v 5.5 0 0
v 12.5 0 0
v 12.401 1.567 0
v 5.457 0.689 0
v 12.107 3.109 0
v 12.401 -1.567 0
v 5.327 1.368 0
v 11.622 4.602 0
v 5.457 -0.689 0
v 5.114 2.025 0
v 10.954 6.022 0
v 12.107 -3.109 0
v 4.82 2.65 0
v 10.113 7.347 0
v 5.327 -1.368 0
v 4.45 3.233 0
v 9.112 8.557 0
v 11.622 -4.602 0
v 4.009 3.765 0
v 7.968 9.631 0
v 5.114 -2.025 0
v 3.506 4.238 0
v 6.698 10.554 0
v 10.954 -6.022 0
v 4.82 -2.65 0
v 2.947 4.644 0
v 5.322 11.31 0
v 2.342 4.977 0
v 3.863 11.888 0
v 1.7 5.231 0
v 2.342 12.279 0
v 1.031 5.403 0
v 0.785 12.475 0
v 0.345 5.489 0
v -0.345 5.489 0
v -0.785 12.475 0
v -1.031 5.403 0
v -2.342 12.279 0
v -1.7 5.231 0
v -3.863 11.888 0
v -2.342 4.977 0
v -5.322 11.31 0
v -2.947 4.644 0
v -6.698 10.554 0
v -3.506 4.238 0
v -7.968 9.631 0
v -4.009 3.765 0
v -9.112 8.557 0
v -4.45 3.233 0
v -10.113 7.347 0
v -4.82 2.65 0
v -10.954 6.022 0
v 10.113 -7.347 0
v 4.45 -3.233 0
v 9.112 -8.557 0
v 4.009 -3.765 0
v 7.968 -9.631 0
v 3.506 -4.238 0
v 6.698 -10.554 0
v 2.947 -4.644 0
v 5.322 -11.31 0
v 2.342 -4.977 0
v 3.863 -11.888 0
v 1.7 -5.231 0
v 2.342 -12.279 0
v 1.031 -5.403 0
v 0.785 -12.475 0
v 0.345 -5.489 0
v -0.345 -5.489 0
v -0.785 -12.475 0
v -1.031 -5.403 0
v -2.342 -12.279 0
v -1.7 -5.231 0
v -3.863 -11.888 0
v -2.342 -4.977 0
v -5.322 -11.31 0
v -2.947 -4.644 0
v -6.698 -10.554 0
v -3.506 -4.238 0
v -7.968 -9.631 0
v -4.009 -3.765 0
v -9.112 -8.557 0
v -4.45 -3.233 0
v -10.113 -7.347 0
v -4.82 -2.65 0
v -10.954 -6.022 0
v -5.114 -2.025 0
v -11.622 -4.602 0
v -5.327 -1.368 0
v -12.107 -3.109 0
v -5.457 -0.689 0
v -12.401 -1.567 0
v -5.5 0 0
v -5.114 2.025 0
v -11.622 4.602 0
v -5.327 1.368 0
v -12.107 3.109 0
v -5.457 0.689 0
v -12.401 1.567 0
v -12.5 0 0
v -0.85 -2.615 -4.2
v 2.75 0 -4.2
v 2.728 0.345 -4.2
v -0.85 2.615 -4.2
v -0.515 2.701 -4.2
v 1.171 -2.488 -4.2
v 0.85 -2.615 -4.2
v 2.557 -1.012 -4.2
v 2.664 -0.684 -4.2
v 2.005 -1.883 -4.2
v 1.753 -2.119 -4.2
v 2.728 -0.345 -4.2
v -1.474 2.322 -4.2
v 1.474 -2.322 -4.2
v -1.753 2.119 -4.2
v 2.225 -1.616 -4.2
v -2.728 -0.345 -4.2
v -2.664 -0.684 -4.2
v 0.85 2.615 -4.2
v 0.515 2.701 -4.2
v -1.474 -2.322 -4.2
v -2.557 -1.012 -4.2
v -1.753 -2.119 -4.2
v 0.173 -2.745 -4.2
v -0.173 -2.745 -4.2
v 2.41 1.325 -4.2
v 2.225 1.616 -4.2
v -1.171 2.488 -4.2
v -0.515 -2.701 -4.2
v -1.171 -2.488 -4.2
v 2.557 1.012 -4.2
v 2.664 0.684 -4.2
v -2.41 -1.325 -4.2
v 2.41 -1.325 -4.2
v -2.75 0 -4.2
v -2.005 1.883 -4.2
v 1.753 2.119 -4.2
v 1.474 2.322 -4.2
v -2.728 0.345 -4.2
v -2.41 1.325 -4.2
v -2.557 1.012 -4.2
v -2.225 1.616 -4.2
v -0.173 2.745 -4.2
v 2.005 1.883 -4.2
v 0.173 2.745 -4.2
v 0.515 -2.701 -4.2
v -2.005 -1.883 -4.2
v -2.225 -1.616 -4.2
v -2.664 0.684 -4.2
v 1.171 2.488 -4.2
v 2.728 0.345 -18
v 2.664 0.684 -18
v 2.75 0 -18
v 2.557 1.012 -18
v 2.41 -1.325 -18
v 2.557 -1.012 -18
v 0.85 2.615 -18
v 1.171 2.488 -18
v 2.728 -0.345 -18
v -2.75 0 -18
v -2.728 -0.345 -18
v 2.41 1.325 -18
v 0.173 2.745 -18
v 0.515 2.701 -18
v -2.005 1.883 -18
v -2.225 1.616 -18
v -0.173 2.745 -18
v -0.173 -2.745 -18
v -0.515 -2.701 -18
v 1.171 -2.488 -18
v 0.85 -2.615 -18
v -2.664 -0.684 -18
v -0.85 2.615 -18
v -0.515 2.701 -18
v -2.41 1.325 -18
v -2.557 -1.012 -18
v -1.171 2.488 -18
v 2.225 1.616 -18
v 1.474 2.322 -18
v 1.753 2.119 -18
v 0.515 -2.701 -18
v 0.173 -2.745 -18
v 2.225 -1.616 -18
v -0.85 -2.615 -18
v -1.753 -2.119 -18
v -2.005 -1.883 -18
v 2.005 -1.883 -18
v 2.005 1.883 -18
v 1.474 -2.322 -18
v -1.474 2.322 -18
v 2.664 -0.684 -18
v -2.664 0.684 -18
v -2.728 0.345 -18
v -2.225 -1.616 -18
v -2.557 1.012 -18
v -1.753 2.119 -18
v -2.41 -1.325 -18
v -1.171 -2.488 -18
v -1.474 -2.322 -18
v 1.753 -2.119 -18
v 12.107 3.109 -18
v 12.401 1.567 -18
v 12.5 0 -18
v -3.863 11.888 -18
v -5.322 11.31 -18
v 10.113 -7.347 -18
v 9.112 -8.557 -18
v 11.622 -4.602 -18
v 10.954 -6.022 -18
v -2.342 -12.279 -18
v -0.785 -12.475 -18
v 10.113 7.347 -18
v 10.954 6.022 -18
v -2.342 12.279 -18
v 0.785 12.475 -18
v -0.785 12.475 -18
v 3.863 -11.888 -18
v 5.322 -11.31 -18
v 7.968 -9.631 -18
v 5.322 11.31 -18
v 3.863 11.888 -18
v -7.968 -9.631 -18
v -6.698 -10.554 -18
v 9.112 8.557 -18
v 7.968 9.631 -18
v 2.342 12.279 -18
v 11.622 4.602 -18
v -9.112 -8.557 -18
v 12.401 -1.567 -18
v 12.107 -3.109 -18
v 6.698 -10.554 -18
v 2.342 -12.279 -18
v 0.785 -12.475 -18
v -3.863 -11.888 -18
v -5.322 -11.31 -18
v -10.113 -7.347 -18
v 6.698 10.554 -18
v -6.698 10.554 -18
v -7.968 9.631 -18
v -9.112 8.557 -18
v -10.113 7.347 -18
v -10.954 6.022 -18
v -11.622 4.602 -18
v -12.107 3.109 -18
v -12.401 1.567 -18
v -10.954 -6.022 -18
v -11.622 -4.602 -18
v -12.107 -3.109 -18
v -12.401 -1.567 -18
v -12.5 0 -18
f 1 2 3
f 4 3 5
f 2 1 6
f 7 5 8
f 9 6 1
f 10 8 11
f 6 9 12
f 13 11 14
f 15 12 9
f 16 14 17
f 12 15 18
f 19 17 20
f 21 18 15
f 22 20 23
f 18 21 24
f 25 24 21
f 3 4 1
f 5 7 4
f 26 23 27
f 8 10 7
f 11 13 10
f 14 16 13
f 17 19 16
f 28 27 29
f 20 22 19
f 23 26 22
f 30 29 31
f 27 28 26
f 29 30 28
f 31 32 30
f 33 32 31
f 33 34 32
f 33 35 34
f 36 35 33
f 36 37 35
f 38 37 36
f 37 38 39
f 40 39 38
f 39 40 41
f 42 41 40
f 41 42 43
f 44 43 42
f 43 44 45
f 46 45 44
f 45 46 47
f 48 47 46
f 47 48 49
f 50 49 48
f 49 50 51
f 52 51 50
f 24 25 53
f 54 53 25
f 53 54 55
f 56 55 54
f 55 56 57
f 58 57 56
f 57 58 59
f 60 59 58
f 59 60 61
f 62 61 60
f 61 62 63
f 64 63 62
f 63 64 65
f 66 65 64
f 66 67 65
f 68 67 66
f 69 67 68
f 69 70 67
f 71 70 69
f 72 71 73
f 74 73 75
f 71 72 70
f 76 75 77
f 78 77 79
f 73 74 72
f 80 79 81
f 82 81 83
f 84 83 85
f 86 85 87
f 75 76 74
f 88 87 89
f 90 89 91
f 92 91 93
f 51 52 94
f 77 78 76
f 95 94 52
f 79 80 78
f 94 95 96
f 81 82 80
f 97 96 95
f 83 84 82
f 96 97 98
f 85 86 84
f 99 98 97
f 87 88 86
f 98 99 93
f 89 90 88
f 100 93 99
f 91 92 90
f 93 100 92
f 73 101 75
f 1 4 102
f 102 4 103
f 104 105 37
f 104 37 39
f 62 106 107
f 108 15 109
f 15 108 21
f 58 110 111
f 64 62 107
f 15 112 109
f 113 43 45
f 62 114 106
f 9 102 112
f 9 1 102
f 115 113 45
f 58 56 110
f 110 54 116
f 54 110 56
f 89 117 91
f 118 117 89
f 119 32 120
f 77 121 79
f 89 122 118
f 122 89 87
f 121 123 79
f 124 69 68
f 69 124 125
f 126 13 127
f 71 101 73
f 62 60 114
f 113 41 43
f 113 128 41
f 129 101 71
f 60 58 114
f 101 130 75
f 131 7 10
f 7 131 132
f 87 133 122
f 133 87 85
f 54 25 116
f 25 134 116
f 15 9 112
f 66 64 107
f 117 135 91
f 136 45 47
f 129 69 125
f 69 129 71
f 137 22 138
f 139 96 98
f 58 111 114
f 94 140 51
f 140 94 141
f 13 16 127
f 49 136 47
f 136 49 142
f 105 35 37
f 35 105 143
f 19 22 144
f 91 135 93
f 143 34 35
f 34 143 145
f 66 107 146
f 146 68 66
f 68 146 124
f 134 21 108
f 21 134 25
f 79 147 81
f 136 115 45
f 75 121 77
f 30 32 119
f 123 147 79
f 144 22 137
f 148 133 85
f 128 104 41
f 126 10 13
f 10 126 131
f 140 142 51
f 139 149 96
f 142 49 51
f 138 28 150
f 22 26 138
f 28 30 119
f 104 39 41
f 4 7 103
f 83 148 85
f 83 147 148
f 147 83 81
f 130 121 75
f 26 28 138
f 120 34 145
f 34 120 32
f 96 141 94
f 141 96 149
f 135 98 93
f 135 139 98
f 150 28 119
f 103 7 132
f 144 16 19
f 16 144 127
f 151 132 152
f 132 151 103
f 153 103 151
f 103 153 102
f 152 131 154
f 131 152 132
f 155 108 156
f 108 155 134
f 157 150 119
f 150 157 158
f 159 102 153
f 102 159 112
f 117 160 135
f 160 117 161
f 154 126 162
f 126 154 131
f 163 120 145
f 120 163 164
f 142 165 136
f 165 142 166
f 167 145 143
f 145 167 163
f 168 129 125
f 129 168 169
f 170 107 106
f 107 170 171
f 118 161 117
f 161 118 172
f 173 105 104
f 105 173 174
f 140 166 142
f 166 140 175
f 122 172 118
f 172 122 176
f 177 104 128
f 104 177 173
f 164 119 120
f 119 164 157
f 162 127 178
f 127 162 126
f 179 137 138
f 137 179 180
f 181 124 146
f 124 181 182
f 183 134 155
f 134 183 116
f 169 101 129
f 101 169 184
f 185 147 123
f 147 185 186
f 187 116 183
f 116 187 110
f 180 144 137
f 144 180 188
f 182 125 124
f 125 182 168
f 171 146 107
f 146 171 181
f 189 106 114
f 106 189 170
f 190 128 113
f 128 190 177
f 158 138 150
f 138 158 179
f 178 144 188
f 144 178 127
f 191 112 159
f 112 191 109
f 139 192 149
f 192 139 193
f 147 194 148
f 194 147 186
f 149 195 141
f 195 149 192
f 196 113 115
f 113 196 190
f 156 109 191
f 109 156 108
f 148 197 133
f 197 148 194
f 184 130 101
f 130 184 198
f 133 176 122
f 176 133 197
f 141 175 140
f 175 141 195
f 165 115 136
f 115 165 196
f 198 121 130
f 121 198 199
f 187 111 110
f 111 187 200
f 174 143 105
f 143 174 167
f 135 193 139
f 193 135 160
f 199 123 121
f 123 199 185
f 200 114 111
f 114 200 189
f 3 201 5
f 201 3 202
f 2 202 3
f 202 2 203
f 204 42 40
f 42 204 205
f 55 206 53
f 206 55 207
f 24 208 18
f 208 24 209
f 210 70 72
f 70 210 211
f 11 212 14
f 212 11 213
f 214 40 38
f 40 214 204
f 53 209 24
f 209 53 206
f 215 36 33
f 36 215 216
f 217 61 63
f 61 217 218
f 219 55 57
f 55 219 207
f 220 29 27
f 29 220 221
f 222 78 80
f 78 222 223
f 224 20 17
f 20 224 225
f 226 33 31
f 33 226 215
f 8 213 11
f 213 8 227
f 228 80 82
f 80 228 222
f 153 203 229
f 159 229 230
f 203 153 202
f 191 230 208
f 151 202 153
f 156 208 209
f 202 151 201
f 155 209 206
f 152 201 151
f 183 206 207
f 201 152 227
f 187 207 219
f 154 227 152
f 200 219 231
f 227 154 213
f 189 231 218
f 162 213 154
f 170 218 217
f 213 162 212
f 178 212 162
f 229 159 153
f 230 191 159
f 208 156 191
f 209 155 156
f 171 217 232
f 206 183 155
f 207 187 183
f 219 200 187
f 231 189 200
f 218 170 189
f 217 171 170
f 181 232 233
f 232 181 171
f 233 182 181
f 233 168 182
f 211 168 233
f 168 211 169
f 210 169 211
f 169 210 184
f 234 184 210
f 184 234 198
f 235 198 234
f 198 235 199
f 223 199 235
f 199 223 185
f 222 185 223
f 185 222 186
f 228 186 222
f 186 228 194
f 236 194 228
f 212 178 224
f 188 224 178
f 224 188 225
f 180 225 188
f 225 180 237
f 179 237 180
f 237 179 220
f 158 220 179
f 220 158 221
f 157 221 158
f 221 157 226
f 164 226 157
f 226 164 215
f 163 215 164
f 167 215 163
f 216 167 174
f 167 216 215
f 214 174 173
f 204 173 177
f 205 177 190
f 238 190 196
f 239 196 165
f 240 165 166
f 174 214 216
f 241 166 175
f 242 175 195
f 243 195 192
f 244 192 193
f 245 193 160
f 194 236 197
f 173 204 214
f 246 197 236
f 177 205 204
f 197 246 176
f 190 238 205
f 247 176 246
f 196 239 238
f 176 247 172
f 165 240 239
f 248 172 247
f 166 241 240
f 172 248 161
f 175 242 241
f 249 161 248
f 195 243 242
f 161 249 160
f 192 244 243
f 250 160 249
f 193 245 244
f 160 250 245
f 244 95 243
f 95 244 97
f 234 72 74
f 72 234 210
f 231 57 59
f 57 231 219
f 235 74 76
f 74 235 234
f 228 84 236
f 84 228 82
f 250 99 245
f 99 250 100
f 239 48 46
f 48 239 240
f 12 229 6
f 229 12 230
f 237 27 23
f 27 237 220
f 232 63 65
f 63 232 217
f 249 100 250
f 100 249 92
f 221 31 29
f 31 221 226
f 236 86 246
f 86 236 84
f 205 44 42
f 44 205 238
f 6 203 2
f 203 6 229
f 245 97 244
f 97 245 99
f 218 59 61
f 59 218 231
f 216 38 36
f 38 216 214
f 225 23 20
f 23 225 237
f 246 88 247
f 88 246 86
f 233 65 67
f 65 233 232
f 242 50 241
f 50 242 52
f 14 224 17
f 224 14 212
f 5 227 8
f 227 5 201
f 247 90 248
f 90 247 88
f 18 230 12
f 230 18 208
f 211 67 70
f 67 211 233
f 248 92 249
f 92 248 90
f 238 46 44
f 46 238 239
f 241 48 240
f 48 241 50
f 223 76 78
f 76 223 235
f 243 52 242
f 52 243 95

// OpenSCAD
$fn = 50;

difference() {
	union() {
		translate(v = [0, 0, -18.0]) {
			cylinder(h = 18, r = 12.5);
		}
	}
	union() {
		translate(v = [0, 0, 0]) {
			rotate(a = [0, 0, 0]) {
				difference() {
					union() {
						translate(v = [0, 0, -21.0]) {
							cylinder(h = 21, r = 2.25);
						}
						translate(v = [0, 0, -4.2]) {
							cylinder(h = 4.2, r1 = 2.75, r2 = 5.5);
						}
						translate(v = [0, 0, -21.0]) {
							cylinder(h = 21, r = 2.75);
						}
						translate(v = [0, 0, -21.0]) {
							cylinder(h = 21, r = 2.25);
						}
					}
					union();
				}
			}
		}
	}
}
